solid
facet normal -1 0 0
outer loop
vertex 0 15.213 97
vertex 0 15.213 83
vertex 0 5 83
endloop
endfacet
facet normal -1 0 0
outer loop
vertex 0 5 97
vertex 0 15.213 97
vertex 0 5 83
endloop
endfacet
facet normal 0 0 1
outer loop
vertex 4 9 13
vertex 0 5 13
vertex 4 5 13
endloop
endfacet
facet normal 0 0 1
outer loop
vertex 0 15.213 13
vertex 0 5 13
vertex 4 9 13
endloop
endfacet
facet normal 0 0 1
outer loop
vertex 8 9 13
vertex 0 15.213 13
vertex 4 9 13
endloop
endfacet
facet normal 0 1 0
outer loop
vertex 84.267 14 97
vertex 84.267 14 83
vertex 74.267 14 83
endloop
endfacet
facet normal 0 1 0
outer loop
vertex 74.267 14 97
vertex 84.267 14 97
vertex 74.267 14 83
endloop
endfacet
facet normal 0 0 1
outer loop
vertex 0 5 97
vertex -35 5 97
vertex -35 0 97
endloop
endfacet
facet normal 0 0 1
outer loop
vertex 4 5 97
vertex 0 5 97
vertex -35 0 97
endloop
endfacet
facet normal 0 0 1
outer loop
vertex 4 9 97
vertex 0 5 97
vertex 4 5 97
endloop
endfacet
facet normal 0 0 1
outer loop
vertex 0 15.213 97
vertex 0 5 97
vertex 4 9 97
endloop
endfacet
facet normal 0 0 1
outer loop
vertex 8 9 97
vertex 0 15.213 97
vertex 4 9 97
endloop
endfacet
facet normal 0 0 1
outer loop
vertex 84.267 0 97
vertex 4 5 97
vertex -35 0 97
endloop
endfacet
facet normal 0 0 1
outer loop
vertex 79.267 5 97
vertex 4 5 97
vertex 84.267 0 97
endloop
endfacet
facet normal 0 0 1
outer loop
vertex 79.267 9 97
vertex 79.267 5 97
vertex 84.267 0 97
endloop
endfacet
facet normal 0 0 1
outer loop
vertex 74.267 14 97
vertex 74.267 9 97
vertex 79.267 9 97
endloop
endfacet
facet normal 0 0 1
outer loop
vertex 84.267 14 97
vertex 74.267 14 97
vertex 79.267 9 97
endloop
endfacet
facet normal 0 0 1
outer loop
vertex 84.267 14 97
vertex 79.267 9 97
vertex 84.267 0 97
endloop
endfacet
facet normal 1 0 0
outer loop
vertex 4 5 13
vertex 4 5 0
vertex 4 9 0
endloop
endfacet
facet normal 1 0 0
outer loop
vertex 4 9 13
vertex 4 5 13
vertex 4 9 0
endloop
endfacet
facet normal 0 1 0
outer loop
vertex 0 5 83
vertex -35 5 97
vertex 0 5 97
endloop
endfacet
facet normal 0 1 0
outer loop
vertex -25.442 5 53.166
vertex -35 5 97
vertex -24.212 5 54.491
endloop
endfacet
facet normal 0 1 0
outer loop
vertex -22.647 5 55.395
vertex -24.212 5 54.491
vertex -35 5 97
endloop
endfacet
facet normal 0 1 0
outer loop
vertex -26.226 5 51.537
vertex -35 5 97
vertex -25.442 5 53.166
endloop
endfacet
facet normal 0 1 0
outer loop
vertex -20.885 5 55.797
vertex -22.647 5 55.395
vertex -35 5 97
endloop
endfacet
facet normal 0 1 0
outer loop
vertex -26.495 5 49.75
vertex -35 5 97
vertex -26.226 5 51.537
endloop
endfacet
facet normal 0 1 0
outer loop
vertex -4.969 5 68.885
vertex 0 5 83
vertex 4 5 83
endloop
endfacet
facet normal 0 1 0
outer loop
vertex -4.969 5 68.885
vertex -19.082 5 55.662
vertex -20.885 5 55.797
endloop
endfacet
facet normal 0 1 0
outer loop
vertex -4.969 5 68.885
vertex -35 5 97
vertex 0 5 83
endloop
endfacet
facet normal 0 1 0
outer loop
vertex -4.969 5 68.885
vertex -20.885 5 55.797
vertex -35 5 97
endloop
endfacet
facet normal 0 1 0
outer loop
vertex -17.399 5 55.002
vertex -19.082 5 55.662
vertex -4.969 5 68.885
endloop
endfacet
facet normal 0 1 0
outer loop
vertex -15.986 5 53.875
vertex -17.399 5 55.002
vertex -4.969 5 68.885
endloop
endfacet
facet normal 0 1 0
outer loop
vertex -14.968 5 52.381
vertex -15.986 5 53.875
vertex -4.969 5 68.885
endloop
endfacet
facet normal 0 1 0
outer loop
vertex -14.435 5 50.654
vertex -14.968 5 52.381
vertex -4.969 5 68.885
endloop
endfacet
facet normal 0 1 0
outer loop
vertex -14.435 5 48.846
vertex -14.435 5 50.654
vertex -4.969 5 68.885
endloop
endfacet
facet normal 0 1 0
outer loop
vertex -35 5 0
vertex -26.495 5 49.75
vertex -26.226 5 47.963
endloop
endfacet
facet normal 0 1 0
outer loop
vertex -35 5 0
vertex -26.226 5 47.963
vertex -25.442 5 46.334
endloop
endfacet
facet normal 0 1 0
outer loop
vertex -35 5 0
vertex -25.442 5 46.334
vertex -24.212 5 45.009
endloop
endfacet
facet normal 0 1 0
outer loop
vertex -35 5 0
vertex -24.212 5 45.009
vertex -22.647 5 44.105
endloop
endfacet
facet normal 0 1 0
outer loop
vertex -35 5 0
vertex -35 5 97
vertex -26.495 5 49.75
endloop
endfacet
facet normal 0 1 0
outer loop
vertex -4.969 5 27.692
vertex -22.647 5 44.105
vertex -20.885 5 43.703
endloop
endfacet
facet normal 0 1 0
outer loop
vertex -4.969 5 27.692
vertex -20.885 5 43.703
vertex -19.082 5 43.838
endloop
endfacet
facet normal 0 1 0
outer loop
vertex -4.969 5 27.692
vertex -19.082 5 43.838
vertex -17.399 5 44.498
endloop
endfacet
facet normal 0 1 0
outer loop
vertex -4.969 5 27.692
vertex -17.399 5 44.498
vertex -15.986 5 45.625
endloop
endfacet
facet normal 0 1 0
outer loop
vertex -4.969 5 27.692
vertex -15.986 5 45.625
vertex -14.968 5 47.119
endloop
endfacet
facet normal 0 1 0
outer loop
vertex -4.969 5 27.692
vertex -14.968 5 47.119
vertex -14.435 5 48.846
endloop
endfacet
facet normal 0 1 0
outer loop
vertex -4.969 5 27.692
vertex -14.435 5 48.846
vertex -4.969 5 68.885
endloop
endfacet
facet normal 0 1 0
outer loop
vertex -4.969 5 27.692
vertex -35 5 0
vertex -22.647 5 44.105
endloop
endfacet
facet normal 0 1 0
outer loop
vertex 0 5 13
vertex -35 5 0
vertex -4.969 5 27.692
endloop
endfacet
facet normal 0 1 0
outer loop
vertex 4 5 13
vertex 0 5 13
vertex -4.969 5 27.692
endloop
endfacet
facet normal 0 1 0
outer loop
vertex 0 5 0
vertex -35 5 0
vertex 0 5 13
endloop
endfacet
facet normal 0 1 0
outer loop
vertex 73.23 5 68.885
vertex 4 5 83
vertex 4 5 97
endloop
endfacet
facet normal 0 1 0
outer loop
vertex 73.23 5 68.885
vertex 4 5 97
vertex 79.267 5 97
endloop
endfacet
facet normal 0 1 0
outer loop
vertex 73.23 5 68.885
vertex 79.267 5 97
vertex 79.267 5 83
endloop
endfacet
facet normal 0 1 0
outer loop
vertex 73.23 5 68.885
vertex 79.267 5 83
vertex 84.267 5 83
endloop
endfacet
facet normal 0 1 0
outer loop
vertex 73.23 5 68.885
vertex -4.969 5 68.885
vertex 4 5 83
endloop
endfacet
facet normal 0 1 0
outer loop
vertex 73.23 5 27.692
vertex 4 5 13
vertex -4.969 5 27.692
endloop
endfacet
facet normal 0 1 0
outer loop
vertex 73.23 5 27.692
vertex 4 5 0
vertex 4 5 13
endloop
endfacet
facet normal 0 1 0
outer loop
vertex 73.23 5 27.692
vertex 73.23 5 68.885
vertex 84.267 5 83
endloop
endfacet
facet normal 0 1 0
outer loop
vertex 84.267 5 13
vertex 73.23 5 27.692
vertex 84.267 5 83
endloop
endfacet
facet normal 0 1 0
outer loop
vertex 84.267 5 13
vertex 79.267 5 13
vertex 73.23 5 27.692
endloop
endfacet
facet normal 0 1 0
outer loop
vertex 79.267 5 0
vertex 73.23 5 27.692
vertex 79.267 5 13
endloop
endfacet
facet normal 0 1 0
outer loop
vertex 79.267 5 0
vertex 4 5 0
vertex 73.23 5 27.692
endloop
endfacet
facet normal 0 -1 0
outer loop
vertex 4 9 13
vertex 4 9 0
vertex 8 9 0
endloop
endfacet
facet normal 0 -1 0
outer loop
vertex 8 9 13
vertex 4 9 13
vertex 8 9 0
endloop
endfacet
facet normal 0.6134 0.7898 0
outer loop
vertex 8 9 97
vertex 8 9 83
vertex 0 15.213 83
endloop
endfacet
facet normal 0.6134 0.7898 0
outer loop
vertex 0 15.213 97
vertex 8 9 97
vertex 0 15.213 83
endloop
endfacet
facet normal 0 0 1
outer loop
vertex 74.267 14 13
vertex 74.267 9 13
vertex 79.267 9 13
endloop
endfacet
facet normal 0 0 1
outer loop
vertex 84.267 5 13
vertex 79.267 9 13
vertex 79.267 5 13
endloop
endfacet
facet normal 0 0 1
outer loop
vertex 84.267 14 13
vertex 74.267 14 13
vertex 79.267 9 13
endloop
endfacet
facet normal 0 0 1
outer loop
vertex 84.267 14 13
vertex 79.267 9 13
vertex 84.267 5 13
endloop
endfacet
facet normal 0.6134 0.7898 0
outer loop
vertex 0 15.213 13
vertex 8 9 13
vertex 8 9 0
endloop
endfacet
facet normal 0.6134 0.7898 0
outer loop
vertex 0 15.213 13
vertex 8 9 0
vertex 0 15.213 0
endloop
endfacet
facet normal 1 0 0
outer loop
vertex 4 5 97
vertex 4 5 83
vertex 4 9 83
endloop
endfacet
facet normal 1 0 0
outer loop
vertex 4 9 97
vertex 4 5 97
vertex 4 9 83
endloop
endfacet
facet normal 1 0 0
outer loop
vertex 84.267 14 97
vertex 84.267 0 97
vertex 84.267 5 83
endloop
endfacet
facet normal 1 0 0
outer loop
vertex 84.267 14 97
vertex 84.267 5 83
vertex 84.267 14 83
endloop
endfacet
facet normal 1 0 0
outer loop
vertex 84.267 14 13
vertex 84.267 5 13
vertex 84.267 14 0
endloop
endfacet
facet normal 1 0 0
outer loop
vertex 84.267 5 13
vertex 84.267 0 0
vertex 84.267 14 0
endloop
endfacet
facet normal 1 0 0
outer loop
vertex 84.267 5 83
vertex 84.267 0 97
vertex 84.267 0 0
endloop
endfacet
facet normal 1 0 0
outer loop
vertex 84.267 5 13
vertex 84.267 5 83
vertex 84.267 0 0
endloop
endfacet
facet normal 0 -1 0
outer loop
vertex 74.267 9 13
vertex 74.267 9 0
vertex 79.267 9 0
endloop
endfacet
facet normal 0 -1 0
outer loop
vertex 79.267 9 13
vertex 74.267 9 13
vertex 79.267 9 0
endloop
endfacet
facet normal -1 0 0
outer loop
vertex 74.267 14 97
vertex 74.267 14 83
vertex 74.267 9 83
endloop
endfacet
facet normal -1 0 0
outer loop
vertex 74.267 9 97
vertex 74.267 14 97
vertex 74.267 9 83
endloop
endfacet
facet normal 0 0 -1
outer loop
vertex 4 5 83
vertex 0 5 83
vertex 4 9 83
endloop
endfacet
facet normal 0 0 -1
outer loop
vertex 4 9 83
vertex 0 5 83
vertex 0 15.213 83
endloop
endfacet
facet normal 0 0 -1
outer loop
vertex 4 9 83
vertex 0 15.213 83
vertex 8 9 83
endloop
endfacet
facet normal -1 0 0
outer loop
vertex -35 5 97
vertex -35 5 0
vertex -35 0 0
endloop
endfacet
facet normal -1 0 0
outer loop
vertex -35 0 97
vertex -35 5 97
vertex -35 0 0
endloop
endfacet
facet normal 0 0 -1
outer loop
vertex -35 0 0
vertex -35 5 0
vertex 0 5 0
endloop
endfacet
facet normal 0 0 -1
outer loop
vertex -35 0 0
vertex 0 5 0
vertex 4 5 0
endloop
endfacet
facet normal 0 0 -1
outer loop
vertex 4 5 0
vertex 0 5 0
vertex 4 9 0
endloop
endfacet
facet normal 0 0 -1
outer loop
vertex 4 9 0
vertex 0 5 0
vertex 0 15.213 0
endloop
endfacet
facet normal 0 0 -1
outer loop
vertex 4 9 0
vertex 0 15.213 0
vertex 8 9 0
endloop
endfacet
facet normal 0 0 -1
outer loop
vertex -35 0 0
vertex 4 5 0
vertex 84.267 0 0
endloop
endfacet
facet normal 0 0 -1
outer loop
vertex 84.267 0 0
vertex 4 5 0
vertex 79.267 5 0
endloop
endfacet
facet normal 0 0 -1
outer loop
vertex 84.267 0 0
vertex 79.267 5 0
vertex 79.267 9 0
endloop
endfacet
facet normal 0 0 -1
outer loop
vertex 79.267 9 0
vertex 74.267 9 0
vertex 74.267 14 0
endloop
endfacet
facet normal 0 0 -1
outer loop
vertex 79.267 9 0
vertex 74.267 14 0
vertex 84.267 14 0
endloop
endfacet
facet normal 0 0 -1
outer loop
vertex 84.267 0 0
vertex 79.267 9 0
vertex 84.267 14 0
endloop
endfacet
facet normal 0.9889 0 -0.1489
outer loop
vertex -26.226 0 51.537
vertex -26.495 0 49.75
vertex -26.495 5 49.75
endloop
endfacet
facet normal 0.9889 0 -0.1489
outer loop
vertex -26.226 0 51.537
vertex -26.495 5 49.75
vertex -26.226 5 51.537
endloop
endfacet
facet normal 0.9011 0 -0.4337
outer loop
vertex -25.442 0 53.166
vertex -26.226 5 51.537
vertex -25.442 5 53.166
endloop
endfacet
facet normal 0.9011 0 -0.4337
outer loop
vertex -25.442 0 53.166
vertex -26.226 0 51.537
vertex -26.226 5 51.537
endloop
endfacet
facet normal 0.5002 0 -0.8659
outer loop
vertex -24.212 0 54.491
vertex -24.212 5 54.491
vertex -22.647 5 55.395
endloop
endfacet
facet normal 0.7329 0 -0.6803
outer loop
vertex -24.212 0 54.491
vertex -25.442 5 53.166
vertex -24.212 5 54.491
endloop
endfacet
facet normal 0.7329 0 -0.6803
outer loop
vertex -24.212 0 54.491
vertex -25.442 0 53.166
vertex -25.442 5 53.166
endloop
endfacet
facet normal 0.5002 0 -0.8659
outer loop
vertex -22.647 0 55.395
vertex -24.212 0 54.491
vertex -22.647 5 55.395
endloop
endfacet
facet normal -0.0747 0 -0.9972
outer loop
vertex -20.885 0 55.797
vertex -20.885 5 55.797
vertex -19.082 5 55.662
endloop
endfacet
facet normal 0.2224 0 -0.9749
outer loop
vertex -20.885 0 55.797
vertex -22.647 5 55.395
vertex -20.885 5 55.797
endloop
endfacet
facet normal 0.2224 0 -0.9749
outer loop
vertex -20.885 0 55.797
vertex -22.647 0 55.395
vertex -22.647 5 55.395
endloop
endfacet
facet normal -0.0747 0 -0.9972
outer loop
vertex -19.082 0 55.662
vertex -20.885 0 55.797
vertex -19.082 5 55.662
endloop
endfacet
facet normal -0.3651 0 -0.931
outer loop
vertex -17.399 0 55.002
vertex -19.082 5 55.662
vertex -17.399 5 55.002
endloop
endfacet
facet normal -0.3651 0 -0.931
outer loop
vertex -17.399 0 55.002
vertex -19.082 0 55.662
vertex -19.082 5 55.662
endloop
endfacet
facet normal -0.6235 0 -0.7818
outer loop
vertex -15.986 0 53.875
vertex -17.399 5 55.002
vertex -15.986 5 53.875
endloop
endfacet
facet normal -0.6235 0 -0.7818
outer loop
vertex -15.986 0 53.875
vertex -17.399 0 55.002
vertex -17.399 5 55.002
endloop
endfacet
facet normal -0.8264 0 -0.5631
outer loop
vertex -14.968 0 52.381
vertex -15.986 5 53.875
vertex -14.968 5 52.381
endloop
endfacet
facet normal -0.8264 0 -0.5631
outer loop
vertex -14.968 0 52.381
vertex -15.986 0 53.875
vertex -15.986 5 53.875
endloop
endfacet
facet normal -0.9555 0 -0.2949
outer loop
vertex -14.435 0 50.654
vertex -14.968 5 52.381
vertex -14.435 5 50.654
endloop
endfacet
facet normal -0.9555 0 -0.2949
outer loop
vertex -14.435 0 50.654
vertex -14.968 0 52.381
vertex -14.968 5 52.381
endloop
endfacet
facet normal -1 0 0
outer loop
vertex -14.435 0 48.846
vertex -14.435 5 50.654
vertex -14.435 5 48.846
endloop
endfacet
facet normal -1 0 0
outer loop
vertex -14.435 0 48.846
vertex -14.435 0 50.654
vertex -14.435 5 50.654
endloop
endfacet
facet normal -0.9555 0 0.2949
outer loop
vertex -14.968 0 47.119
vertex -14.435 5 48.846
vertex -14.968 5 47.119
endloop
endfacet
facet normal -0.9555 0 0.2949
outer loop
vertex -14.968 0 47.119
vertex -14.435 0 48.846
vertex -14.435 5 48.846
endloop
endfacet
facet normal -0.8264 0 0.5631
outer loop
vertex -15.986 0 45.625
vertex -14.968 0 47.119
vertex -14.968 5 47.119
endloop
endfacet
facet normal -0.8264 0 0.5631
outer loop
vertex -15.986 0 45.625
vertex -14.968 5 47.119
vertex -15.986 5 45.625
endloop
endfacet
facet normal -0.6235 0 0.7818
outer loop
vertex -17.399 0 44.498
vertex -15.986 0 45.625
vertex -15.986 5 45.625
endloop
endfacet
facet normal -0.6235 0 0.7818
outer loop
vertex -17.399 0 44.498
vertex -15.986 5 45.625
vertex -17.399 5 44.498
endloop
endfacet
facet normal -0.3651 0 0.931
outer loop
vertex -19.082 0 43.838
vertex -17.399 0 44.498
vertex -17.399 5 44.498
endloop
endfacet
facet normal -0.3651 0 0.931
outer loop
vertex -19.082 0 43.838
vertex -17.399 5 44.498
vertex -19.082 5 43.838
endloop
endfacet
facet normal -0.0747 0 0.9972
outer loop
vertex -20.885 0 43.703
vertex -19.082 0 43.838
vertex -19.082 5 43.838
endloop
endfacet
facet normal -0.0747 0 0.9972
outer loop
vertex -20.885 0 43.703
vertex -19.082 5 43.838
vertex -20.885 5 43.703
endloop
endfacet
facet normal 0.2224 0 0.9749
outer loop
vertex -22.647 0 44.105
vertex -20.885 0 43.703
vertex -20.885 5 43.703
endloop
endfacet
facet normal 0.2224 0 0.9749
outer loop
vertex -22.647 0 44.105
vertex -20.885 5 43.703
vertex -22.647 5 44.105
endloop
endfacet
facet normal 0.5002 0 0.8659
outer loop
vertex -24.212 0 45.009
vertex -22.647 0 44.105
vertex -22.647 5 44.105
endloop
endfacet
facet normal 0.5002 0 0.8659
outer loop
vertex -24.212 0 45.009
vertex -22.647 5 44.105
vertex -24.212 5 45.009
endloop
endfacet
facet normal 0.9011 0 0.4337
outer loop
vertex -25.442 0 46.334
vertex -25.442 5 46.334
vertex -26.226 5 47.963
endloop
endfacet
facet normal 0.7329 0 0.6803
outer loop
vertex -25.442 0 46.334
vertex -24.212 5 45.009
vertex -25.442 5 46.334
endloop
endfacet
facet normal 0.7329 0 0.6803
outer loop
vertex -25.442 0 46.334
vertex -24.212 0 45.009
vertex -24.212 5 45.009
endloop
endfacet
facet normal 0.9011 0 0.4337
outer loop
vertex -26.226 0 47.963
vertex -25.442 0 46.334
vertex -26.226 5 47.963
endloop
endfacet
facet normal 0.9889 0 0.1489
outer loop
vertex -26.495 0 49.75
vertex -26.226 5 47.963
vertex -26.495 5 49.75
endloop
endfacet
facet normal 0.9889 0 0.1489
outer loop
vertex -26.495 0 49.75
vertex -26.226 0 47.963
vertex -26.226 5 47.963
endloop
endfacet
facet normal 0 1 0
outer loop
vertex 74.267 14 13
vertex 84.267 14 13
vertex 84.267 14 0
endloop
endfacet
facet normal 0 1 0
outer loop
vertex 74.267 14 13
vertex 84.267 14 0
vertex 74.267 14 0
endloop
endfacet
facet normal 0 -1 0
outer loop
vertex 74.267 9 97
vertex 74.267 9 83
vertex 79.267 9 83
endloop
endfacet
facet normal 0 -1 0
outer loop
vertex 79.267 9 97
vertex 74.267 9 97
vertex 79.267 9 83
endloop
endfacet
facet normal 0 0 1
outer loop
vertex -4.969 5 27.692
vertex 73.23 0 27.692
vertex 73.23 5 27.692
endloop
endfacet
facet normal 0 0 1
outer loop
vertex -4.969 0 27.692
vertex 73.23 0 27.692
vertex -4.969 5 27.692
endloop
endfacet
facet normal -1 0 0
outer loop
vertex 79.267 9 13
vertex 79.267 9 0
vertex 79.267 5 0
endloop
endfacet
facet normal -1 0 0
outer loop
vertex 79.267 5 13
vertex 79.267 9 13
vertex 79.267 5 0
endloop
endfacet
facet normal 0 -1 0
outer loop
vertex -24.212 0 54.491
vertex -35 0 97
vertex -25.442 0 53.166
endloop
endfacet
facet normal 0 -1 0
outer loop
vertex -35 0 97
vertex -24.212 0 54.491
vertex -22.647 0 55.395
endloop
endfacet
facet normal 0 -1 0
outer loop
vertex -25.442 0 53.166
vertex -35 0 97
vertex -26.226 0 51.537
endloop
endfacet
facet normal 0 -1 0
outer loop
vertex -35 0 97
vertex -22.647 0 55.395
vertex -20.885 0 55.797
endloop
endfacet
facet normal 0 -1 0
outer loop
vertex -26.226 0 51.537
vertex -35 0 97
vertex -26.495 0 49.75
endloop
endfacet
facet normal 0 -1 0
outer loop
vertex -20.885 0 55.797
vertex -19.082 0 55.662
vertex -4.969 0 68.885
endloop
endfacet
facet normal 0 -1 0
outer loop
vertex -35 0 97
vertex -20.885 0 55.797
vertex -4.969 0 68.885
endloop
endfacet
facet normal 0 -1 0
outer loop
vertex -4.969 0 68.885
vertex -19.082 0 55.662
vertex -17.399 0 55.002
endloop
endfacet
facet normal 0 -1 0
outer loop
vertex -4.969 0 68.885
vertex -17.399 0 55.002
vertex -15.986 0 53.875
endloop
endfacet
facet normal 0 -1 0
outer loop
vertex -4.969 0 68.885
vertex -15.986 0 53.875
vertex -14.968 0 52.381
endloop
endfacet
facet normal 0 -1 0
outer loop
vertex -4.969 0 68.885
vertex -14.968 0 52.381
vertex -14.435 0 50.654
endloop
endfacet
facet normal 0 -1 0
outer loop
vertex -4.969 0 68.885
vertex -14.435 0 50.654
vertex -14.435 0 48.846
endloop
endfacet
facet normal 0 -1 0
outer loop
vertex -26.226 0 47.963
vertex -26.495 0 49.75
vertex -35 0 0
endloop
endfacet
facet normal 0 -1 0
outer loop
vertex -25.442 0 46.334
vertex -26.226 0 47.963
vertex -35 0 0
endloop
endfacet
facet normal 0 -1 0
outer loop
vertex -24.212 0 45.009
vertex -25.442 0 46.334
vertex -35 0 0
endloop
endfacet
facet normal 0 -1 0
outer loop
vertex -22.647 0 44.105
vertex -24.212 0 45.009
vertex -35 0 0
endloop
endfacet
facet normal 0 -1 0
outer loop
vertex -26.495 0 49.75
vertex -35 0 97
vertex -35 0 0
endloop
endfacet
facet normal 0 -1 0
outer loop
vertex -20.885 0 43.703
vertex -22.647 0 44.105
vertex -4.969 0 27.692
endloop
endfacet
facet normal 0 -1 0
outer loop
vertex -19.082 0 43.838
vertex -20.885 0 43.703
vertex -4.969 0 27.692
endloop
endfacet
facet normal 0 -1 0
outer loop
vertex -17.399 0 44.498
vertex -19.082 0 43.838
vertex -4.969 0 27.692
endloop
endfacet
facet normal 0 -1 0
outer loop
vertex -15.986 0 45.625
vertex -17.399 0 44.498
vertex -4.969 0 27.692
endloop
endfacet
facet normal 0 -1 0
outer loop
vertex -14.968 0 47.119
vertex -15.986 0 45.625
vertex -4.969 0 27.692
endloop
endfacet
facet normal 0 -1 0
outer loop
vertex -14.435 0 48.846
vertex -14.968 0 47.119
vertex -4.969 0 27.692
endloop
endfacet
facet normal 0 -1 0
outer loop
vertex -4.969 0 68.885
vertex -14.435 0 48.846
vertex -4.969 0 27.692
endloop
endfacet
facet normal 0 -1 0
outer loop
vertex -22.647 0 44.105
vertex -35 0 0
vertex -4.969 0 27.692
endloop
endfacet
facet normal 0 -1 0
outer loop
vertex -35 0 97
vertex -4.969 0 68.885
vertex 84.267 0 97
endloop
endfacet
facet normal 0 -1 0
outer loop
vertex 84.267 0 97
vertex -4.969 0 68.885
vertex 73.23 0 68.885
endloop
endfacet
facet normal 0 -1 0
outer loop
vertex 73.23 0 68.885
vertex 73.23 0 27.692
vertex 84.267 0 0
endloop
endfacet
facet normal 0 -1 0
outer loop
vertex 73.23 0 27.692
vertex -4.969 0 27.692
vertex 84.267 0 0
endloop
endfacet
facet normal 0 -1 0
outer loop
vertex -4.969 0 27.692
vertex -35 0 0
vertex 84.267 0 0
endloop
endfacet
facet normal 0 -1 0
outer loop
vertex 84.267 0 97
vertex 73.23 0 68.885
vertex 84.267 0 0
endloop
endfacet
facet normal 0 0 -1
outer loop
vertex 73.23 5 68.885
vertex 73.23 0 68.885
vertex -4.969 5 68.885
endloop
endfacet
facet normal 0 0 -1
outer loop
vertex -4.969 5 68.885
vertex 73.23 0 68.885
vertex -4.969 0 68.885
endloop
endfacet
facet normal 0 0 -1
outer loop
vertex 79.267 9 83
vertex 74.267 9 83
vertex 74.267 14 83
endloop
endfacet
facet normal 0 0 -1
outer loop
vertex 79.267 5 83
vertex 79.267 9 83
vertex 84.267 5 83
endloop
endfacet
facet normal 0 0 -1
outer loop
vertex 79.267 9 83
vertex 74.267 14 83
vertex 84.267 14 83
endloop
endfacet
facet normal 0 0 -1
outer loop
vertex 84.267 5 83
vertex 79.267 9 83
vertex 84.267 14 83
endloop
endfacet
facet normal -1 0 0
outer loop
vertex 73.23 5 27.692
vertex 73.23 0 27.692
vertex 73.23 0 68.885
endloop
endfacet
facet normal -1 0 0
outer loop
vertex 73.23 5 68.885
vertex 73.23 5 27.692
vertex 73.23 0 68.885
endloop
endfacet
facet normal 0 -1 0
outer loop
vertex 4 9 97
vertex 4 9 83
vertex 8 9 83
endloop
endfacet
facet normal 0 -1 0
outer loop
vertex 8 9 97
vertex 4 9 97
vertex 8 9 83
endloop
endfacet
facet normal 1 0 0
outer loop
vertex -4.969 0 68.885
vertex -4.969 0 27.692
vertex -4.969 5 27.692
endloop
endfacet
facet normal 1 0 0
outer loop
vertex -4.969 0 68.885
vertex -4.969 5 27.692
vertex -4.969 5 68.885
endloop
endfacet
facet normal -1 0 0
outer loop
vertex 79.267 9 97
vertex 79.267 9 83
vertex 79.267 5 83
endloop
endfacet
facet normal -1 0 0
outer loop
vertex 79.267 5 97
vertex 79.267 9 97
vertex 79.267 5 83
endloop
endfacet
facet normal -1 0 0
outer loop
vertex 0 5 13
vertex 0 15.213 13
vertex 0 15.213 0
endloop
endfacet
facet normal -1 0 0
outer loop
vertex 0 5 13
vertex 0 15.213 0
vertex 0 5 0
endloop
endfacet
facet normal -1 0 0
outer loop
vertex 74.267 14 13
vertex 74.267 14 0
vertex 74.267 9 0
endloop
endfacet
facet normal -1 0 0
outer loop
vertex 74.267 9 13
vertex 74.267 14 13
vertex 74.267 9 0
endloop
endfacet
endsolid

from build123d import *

# Parameters (mm, degrees)
SKETCH003_R      = 6.064037
EXTRUDE002_DEPTH = 50
SKETCH002_W      = 78.198598
SKETCH002_H      = 41.193907
EXTRUDE001_DEPTH = 50
SKETCH001_W      = 95.175157
SKETCH001_H      = 14.36759
EXTRUDE_DEPTH    = 70
PAD_DEPTH        = 97


with BuildPart() as extrude002:
    # Sketch003 (on Face5 of Cut001) → Extrude002 (new body)
    with BuildSketch(Plane(origin=(0, 5, 0), x_dir=(-1, 0, 0), z_dir=(0, 1, 0))):
        with Locations((20.43144, 49.75)):
            Circle(SKETCH003_R)
    extrude(amount=EXTRUDE002_DEPTH)


with BuildPart() as extrude002_1:
    # Extrude002 placement: moved
    add(extrude002.part.moved(Location((0, -30, 0))))


with BuildPart() as extrude001:
    # Sketch002 (on Face26 of Cut) → Extrude001 (new body)
    with BuildSketch(Plane(origin=(0, 5, 0), x_dir=(-1, 0, 0), z_dir=(0, 1, 0))):
        with Locations((-34.130269, 48.288522)):
            Rectangle(SKETCH002_W, SKETCH002_H)
    extrude(amount=EXTRUDE001_DEPTH)


with BuildPart() as extrude001_1:
    # Extrude001 placement: moved
    add(extrude001.part.moved(Location((0, -20, 0))))


with BuildPart() as extrude_body:
    # Sketch001 (on DatumPlane) → Extrude (new body)
    with BuildSketch(Plane.XY.offset(97)):
        with Locations((43.402381, 12.183795)):
            Rectangle(SKETCH001_W, SKETCH001_H)
    extrude(amount=EXTRUDE_DEPTH)


with BuildPart() as extrude_body_1:
    # Extrude placement: moved
    add(extrude_body.part.moved(Location((0, 0, -84))))


with BuildPart() as cut002:
    # Sketch → Pad (new body)
    with BuildSketch(Plane.XY):
        Polygon((0, 0), (84.267495, 0), (84.267495, 14), (74.267495, 14), (74.267495, 9), (79.267495, 9), (79.267495, 5), (4, 5), (4, 9), (8, 9), (0, 15.213463), (0, 5), (-35, 5), (-35, 0), align=None)
    extrude(amount=PAD_DEPTH)

    # Cut: cut Extrude body
    add(extrude_body_1.part, mode=Mode.SUBTRACT)

    # Cut001: cut Extrude001
    add(extrude001_1.part, mode=Mode.SUBTRACT)

    # Cut002: cut Extrude002
    add(extrude002_1.part, mode=Mode.SUBTRACT)


solid = cut002.part
